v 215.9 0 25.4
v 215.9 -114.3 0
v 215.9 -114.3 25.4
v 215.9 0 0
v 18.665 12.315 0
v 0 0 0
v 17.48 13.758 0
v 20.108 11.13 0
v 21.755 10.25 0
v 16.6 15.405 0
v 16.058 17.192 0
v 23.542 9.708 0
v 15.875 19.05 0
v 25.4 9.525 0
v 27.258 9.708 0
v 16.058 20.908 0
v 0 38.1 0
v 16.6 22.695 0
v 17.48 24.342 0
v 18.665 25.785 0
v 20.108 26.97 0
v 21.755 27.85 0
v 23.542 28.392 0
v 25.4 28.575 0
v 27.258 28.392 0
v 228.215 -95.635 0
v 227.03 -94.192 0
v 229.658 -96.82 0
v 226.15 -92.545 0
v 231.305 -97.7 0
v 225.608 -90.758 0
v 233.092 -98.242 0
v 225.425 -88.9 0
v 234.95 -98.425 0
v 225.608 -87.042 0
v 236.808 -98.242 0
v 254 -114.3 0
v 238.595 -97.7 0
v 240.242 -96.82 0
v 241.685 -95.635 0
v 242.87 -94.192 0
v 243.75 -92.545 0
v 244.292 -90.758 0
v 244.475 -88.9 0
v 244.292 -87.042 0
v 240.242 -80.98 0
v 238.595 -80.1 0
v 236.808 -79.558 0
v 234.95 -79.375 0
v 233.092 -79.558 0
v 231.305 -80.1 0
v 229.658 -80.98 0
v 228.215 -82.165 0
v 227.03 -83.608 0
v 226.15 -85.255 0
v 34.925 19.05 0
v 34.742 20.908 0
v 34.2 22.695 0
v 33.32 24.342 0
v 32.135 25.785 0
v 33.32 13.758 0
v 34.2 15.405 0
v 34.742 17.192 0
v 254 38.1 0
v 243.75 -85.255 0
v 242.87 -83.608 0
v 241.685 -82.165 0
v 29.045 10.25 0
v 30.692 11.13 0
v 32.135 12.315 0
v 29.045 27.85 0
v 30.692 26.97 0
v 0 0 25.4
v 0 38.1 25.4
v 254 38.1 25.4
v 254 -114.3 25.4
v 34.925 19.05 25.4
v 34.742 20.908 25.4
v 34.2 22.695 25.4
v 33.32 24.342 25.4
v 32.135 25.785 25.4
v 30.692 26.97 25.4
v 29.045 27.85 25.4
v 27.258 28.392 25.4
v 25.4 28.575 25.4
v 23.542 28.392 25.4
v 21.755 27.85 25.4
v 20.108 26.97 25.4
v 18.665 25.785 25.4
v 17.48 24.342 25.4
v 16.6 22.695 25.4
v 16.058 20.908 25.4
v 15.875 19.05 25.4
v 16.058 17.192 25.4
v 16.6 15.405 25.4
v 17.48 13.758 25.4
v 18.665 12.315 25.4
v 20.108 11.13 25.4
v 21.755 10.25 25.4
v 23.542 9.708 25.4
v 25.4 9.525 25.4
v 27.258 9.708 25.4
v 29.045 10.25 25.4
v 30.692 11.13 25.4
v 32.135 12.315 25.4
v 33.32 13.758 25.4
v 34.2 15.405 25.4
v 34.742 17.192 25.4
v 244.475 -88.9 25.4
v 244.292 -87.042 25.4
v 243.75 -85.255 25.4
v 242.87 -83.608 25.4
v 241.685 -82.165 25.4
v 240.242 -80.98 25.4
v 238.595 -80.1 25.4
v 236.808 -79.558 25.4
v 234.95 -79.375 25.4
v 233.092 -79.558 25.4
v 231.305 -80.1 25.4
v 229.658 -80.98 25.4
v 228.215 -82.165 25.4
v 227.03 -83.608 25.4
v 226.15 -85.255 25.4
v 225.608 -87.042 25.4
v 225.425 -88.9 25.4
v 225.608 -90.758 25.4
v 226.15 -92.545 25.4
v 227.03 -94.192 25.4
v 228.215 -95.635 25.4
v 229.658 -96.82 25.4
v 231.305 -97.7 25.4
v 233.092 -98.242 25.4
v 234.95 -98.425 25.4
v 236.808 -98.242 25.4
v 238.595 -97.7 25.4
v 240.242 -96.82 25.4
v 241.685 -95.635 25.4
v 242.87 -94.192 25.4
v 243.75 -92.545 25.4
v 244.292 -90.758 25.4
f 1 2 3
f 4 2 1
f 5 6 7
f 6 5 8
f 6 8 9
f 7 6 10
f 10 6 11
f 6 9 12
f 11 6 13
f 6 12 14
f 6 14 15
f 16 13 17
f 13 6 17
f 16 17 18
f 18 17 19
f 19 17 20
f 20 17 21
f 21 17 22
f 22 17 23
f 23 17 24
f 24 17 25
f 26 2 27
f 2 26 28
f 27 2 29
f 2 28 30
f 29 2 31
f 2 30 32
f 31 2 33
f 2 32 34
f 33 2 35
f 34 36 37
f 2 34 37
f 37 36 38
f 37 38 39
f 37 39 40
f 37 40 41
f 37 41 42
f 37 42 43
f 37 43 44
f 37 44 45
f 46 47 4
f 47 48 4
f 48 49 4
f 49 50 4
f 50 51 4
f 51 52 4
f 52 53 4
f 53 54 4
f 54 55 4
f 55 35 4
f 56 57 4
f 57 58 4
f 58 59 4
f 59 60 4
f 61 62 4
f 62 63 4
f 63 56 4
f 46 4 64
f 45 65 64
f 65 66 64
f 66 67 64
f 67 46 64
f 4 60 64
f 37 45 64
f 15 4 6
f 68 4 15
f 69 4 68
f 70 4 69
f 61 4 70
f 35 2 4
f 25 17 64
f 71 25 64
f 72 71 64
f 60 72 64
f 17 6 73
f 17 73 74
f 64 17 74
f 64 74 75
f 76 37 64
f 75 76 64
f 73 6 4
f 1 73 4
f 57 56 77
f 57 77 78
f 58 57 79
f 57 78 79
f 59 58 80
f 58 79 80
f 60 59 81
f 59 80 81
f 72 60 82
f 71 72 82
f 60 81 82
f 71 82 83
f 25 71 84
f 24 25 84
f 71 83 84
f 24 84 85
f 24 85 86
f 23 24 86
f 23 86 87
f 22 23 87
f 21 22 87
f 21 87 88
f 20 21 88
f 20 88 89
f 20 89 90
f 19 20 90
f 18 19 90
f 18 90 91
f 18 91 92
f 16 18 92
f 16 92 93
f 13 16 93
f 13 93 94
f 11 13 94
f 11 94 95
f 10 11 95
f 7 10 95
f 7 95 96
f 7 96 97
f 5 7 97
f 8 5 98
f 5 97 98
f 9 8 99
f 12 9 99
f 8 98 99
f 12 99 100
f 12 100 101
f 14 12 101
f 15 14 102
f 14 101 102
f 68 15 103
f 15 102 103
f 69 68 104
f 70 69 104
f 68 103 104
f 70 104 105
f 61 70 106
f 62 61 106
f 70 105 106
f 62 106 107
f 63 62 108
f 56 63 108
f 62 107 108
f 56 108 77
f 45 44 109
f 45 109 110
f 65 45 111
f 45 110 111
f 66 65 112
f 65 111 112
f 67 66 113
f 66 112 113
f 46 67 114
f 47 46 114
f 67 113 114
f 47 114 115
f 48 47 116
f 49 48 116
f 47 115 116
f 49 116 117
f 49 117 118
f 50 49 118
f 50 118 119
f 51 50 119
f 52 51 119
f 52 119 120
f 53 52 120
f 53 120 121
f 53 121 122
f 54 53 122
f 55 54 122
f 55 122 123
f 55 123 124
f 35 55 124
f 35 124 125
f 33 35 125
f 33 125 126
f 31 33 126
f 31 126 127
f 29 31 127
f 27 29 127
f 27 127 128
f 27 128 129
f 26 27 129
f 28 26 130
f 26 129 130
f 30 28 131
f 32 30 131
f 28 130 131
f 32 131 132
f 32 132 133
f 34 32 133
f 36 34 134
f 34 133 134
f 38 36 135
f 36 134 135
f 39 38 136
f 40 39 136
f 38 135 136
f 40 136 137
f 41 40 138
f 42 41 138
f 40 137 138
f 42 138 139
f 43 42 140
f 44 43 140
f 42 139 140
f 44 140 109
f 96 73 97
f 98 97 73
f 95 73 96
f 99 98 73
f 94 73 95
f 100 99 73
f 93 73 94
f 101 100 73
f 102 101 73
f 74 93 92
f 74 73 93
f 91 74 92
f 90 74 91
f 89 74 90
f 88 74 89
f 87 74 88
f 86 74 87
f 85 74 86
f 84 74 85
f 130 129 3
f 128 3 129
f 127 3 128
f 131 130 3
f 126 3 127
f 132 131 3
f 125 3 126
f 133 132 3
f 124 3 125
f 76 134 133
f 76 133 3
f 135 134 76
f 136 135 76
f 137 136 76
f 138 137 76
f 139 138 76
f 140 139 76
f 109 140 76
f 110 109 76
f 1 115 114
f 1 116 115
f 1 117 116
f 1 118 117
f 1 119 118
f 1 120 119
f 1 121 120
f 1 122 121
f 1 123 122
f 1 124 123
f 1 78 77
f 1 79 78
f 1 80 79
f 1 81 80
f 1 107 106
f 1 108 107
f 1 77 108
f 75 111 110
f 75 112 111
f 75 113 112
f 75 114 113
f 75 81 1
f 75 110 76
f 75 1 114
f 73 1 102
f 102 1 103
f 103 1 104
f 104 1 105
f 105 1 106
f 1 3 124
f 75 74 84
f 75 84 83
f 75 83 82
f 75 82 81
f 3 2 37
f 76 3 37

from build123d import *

# Parameters (mm, degrees)
SKETCH1_W           = 254
SKETCH1_H           = 38.1
SKETCH1_W_2         = 38.1
SKETCH1_H_2         = 114.3
BOSS_EXTRUDE1_DEPTH = 25.4
SKETCH2_R           = 9.525
CUT_EXTRUDE1_DEPTH  = 280.688487428
SKETCH3_R           = 9.525
CUT_EXTRUDE2_DEPTH  = 280.688487428


with BuildPart() as part:
    # Sketch1 → Boss-Extrude1 (new body)
    with BuildSketch(Plane.XY):
        with Locations((127, 19.05)):
            Rectangle(SKETCH1_W, SKETCH1_H)
        with Locations((234.95, -57.15)):
            Rectangle(SKETCH1_W_2, SKETCH1_H_2)
    extrude(amount=BOSS_EXTRUDE1_DEPTH)

    # Sketch2 → Cut-Extrude1 (cut, through all)
    with BuildSketch(Plane.XY.offset(25.4)):
        with Locations((25.4, 19.05)):
            Circle(SKETCH2_R)
    extrude(amount=-CUT_EXTRUDE1_DEPTH, mode=Mode.SUBTRACT)

    # Sketch3 → Cut-Extrude2 (cut, through all)
    with BuildSketch(Plane.XY.offset(25.4)):
        with Locations((234.95, -88.9)):
            Circle(SKETCH3_R)
    extrude(amount=-CUT_EXTRUDE2_DEPTH, mode=Mode.SUBTRACT)


solid = part.part
